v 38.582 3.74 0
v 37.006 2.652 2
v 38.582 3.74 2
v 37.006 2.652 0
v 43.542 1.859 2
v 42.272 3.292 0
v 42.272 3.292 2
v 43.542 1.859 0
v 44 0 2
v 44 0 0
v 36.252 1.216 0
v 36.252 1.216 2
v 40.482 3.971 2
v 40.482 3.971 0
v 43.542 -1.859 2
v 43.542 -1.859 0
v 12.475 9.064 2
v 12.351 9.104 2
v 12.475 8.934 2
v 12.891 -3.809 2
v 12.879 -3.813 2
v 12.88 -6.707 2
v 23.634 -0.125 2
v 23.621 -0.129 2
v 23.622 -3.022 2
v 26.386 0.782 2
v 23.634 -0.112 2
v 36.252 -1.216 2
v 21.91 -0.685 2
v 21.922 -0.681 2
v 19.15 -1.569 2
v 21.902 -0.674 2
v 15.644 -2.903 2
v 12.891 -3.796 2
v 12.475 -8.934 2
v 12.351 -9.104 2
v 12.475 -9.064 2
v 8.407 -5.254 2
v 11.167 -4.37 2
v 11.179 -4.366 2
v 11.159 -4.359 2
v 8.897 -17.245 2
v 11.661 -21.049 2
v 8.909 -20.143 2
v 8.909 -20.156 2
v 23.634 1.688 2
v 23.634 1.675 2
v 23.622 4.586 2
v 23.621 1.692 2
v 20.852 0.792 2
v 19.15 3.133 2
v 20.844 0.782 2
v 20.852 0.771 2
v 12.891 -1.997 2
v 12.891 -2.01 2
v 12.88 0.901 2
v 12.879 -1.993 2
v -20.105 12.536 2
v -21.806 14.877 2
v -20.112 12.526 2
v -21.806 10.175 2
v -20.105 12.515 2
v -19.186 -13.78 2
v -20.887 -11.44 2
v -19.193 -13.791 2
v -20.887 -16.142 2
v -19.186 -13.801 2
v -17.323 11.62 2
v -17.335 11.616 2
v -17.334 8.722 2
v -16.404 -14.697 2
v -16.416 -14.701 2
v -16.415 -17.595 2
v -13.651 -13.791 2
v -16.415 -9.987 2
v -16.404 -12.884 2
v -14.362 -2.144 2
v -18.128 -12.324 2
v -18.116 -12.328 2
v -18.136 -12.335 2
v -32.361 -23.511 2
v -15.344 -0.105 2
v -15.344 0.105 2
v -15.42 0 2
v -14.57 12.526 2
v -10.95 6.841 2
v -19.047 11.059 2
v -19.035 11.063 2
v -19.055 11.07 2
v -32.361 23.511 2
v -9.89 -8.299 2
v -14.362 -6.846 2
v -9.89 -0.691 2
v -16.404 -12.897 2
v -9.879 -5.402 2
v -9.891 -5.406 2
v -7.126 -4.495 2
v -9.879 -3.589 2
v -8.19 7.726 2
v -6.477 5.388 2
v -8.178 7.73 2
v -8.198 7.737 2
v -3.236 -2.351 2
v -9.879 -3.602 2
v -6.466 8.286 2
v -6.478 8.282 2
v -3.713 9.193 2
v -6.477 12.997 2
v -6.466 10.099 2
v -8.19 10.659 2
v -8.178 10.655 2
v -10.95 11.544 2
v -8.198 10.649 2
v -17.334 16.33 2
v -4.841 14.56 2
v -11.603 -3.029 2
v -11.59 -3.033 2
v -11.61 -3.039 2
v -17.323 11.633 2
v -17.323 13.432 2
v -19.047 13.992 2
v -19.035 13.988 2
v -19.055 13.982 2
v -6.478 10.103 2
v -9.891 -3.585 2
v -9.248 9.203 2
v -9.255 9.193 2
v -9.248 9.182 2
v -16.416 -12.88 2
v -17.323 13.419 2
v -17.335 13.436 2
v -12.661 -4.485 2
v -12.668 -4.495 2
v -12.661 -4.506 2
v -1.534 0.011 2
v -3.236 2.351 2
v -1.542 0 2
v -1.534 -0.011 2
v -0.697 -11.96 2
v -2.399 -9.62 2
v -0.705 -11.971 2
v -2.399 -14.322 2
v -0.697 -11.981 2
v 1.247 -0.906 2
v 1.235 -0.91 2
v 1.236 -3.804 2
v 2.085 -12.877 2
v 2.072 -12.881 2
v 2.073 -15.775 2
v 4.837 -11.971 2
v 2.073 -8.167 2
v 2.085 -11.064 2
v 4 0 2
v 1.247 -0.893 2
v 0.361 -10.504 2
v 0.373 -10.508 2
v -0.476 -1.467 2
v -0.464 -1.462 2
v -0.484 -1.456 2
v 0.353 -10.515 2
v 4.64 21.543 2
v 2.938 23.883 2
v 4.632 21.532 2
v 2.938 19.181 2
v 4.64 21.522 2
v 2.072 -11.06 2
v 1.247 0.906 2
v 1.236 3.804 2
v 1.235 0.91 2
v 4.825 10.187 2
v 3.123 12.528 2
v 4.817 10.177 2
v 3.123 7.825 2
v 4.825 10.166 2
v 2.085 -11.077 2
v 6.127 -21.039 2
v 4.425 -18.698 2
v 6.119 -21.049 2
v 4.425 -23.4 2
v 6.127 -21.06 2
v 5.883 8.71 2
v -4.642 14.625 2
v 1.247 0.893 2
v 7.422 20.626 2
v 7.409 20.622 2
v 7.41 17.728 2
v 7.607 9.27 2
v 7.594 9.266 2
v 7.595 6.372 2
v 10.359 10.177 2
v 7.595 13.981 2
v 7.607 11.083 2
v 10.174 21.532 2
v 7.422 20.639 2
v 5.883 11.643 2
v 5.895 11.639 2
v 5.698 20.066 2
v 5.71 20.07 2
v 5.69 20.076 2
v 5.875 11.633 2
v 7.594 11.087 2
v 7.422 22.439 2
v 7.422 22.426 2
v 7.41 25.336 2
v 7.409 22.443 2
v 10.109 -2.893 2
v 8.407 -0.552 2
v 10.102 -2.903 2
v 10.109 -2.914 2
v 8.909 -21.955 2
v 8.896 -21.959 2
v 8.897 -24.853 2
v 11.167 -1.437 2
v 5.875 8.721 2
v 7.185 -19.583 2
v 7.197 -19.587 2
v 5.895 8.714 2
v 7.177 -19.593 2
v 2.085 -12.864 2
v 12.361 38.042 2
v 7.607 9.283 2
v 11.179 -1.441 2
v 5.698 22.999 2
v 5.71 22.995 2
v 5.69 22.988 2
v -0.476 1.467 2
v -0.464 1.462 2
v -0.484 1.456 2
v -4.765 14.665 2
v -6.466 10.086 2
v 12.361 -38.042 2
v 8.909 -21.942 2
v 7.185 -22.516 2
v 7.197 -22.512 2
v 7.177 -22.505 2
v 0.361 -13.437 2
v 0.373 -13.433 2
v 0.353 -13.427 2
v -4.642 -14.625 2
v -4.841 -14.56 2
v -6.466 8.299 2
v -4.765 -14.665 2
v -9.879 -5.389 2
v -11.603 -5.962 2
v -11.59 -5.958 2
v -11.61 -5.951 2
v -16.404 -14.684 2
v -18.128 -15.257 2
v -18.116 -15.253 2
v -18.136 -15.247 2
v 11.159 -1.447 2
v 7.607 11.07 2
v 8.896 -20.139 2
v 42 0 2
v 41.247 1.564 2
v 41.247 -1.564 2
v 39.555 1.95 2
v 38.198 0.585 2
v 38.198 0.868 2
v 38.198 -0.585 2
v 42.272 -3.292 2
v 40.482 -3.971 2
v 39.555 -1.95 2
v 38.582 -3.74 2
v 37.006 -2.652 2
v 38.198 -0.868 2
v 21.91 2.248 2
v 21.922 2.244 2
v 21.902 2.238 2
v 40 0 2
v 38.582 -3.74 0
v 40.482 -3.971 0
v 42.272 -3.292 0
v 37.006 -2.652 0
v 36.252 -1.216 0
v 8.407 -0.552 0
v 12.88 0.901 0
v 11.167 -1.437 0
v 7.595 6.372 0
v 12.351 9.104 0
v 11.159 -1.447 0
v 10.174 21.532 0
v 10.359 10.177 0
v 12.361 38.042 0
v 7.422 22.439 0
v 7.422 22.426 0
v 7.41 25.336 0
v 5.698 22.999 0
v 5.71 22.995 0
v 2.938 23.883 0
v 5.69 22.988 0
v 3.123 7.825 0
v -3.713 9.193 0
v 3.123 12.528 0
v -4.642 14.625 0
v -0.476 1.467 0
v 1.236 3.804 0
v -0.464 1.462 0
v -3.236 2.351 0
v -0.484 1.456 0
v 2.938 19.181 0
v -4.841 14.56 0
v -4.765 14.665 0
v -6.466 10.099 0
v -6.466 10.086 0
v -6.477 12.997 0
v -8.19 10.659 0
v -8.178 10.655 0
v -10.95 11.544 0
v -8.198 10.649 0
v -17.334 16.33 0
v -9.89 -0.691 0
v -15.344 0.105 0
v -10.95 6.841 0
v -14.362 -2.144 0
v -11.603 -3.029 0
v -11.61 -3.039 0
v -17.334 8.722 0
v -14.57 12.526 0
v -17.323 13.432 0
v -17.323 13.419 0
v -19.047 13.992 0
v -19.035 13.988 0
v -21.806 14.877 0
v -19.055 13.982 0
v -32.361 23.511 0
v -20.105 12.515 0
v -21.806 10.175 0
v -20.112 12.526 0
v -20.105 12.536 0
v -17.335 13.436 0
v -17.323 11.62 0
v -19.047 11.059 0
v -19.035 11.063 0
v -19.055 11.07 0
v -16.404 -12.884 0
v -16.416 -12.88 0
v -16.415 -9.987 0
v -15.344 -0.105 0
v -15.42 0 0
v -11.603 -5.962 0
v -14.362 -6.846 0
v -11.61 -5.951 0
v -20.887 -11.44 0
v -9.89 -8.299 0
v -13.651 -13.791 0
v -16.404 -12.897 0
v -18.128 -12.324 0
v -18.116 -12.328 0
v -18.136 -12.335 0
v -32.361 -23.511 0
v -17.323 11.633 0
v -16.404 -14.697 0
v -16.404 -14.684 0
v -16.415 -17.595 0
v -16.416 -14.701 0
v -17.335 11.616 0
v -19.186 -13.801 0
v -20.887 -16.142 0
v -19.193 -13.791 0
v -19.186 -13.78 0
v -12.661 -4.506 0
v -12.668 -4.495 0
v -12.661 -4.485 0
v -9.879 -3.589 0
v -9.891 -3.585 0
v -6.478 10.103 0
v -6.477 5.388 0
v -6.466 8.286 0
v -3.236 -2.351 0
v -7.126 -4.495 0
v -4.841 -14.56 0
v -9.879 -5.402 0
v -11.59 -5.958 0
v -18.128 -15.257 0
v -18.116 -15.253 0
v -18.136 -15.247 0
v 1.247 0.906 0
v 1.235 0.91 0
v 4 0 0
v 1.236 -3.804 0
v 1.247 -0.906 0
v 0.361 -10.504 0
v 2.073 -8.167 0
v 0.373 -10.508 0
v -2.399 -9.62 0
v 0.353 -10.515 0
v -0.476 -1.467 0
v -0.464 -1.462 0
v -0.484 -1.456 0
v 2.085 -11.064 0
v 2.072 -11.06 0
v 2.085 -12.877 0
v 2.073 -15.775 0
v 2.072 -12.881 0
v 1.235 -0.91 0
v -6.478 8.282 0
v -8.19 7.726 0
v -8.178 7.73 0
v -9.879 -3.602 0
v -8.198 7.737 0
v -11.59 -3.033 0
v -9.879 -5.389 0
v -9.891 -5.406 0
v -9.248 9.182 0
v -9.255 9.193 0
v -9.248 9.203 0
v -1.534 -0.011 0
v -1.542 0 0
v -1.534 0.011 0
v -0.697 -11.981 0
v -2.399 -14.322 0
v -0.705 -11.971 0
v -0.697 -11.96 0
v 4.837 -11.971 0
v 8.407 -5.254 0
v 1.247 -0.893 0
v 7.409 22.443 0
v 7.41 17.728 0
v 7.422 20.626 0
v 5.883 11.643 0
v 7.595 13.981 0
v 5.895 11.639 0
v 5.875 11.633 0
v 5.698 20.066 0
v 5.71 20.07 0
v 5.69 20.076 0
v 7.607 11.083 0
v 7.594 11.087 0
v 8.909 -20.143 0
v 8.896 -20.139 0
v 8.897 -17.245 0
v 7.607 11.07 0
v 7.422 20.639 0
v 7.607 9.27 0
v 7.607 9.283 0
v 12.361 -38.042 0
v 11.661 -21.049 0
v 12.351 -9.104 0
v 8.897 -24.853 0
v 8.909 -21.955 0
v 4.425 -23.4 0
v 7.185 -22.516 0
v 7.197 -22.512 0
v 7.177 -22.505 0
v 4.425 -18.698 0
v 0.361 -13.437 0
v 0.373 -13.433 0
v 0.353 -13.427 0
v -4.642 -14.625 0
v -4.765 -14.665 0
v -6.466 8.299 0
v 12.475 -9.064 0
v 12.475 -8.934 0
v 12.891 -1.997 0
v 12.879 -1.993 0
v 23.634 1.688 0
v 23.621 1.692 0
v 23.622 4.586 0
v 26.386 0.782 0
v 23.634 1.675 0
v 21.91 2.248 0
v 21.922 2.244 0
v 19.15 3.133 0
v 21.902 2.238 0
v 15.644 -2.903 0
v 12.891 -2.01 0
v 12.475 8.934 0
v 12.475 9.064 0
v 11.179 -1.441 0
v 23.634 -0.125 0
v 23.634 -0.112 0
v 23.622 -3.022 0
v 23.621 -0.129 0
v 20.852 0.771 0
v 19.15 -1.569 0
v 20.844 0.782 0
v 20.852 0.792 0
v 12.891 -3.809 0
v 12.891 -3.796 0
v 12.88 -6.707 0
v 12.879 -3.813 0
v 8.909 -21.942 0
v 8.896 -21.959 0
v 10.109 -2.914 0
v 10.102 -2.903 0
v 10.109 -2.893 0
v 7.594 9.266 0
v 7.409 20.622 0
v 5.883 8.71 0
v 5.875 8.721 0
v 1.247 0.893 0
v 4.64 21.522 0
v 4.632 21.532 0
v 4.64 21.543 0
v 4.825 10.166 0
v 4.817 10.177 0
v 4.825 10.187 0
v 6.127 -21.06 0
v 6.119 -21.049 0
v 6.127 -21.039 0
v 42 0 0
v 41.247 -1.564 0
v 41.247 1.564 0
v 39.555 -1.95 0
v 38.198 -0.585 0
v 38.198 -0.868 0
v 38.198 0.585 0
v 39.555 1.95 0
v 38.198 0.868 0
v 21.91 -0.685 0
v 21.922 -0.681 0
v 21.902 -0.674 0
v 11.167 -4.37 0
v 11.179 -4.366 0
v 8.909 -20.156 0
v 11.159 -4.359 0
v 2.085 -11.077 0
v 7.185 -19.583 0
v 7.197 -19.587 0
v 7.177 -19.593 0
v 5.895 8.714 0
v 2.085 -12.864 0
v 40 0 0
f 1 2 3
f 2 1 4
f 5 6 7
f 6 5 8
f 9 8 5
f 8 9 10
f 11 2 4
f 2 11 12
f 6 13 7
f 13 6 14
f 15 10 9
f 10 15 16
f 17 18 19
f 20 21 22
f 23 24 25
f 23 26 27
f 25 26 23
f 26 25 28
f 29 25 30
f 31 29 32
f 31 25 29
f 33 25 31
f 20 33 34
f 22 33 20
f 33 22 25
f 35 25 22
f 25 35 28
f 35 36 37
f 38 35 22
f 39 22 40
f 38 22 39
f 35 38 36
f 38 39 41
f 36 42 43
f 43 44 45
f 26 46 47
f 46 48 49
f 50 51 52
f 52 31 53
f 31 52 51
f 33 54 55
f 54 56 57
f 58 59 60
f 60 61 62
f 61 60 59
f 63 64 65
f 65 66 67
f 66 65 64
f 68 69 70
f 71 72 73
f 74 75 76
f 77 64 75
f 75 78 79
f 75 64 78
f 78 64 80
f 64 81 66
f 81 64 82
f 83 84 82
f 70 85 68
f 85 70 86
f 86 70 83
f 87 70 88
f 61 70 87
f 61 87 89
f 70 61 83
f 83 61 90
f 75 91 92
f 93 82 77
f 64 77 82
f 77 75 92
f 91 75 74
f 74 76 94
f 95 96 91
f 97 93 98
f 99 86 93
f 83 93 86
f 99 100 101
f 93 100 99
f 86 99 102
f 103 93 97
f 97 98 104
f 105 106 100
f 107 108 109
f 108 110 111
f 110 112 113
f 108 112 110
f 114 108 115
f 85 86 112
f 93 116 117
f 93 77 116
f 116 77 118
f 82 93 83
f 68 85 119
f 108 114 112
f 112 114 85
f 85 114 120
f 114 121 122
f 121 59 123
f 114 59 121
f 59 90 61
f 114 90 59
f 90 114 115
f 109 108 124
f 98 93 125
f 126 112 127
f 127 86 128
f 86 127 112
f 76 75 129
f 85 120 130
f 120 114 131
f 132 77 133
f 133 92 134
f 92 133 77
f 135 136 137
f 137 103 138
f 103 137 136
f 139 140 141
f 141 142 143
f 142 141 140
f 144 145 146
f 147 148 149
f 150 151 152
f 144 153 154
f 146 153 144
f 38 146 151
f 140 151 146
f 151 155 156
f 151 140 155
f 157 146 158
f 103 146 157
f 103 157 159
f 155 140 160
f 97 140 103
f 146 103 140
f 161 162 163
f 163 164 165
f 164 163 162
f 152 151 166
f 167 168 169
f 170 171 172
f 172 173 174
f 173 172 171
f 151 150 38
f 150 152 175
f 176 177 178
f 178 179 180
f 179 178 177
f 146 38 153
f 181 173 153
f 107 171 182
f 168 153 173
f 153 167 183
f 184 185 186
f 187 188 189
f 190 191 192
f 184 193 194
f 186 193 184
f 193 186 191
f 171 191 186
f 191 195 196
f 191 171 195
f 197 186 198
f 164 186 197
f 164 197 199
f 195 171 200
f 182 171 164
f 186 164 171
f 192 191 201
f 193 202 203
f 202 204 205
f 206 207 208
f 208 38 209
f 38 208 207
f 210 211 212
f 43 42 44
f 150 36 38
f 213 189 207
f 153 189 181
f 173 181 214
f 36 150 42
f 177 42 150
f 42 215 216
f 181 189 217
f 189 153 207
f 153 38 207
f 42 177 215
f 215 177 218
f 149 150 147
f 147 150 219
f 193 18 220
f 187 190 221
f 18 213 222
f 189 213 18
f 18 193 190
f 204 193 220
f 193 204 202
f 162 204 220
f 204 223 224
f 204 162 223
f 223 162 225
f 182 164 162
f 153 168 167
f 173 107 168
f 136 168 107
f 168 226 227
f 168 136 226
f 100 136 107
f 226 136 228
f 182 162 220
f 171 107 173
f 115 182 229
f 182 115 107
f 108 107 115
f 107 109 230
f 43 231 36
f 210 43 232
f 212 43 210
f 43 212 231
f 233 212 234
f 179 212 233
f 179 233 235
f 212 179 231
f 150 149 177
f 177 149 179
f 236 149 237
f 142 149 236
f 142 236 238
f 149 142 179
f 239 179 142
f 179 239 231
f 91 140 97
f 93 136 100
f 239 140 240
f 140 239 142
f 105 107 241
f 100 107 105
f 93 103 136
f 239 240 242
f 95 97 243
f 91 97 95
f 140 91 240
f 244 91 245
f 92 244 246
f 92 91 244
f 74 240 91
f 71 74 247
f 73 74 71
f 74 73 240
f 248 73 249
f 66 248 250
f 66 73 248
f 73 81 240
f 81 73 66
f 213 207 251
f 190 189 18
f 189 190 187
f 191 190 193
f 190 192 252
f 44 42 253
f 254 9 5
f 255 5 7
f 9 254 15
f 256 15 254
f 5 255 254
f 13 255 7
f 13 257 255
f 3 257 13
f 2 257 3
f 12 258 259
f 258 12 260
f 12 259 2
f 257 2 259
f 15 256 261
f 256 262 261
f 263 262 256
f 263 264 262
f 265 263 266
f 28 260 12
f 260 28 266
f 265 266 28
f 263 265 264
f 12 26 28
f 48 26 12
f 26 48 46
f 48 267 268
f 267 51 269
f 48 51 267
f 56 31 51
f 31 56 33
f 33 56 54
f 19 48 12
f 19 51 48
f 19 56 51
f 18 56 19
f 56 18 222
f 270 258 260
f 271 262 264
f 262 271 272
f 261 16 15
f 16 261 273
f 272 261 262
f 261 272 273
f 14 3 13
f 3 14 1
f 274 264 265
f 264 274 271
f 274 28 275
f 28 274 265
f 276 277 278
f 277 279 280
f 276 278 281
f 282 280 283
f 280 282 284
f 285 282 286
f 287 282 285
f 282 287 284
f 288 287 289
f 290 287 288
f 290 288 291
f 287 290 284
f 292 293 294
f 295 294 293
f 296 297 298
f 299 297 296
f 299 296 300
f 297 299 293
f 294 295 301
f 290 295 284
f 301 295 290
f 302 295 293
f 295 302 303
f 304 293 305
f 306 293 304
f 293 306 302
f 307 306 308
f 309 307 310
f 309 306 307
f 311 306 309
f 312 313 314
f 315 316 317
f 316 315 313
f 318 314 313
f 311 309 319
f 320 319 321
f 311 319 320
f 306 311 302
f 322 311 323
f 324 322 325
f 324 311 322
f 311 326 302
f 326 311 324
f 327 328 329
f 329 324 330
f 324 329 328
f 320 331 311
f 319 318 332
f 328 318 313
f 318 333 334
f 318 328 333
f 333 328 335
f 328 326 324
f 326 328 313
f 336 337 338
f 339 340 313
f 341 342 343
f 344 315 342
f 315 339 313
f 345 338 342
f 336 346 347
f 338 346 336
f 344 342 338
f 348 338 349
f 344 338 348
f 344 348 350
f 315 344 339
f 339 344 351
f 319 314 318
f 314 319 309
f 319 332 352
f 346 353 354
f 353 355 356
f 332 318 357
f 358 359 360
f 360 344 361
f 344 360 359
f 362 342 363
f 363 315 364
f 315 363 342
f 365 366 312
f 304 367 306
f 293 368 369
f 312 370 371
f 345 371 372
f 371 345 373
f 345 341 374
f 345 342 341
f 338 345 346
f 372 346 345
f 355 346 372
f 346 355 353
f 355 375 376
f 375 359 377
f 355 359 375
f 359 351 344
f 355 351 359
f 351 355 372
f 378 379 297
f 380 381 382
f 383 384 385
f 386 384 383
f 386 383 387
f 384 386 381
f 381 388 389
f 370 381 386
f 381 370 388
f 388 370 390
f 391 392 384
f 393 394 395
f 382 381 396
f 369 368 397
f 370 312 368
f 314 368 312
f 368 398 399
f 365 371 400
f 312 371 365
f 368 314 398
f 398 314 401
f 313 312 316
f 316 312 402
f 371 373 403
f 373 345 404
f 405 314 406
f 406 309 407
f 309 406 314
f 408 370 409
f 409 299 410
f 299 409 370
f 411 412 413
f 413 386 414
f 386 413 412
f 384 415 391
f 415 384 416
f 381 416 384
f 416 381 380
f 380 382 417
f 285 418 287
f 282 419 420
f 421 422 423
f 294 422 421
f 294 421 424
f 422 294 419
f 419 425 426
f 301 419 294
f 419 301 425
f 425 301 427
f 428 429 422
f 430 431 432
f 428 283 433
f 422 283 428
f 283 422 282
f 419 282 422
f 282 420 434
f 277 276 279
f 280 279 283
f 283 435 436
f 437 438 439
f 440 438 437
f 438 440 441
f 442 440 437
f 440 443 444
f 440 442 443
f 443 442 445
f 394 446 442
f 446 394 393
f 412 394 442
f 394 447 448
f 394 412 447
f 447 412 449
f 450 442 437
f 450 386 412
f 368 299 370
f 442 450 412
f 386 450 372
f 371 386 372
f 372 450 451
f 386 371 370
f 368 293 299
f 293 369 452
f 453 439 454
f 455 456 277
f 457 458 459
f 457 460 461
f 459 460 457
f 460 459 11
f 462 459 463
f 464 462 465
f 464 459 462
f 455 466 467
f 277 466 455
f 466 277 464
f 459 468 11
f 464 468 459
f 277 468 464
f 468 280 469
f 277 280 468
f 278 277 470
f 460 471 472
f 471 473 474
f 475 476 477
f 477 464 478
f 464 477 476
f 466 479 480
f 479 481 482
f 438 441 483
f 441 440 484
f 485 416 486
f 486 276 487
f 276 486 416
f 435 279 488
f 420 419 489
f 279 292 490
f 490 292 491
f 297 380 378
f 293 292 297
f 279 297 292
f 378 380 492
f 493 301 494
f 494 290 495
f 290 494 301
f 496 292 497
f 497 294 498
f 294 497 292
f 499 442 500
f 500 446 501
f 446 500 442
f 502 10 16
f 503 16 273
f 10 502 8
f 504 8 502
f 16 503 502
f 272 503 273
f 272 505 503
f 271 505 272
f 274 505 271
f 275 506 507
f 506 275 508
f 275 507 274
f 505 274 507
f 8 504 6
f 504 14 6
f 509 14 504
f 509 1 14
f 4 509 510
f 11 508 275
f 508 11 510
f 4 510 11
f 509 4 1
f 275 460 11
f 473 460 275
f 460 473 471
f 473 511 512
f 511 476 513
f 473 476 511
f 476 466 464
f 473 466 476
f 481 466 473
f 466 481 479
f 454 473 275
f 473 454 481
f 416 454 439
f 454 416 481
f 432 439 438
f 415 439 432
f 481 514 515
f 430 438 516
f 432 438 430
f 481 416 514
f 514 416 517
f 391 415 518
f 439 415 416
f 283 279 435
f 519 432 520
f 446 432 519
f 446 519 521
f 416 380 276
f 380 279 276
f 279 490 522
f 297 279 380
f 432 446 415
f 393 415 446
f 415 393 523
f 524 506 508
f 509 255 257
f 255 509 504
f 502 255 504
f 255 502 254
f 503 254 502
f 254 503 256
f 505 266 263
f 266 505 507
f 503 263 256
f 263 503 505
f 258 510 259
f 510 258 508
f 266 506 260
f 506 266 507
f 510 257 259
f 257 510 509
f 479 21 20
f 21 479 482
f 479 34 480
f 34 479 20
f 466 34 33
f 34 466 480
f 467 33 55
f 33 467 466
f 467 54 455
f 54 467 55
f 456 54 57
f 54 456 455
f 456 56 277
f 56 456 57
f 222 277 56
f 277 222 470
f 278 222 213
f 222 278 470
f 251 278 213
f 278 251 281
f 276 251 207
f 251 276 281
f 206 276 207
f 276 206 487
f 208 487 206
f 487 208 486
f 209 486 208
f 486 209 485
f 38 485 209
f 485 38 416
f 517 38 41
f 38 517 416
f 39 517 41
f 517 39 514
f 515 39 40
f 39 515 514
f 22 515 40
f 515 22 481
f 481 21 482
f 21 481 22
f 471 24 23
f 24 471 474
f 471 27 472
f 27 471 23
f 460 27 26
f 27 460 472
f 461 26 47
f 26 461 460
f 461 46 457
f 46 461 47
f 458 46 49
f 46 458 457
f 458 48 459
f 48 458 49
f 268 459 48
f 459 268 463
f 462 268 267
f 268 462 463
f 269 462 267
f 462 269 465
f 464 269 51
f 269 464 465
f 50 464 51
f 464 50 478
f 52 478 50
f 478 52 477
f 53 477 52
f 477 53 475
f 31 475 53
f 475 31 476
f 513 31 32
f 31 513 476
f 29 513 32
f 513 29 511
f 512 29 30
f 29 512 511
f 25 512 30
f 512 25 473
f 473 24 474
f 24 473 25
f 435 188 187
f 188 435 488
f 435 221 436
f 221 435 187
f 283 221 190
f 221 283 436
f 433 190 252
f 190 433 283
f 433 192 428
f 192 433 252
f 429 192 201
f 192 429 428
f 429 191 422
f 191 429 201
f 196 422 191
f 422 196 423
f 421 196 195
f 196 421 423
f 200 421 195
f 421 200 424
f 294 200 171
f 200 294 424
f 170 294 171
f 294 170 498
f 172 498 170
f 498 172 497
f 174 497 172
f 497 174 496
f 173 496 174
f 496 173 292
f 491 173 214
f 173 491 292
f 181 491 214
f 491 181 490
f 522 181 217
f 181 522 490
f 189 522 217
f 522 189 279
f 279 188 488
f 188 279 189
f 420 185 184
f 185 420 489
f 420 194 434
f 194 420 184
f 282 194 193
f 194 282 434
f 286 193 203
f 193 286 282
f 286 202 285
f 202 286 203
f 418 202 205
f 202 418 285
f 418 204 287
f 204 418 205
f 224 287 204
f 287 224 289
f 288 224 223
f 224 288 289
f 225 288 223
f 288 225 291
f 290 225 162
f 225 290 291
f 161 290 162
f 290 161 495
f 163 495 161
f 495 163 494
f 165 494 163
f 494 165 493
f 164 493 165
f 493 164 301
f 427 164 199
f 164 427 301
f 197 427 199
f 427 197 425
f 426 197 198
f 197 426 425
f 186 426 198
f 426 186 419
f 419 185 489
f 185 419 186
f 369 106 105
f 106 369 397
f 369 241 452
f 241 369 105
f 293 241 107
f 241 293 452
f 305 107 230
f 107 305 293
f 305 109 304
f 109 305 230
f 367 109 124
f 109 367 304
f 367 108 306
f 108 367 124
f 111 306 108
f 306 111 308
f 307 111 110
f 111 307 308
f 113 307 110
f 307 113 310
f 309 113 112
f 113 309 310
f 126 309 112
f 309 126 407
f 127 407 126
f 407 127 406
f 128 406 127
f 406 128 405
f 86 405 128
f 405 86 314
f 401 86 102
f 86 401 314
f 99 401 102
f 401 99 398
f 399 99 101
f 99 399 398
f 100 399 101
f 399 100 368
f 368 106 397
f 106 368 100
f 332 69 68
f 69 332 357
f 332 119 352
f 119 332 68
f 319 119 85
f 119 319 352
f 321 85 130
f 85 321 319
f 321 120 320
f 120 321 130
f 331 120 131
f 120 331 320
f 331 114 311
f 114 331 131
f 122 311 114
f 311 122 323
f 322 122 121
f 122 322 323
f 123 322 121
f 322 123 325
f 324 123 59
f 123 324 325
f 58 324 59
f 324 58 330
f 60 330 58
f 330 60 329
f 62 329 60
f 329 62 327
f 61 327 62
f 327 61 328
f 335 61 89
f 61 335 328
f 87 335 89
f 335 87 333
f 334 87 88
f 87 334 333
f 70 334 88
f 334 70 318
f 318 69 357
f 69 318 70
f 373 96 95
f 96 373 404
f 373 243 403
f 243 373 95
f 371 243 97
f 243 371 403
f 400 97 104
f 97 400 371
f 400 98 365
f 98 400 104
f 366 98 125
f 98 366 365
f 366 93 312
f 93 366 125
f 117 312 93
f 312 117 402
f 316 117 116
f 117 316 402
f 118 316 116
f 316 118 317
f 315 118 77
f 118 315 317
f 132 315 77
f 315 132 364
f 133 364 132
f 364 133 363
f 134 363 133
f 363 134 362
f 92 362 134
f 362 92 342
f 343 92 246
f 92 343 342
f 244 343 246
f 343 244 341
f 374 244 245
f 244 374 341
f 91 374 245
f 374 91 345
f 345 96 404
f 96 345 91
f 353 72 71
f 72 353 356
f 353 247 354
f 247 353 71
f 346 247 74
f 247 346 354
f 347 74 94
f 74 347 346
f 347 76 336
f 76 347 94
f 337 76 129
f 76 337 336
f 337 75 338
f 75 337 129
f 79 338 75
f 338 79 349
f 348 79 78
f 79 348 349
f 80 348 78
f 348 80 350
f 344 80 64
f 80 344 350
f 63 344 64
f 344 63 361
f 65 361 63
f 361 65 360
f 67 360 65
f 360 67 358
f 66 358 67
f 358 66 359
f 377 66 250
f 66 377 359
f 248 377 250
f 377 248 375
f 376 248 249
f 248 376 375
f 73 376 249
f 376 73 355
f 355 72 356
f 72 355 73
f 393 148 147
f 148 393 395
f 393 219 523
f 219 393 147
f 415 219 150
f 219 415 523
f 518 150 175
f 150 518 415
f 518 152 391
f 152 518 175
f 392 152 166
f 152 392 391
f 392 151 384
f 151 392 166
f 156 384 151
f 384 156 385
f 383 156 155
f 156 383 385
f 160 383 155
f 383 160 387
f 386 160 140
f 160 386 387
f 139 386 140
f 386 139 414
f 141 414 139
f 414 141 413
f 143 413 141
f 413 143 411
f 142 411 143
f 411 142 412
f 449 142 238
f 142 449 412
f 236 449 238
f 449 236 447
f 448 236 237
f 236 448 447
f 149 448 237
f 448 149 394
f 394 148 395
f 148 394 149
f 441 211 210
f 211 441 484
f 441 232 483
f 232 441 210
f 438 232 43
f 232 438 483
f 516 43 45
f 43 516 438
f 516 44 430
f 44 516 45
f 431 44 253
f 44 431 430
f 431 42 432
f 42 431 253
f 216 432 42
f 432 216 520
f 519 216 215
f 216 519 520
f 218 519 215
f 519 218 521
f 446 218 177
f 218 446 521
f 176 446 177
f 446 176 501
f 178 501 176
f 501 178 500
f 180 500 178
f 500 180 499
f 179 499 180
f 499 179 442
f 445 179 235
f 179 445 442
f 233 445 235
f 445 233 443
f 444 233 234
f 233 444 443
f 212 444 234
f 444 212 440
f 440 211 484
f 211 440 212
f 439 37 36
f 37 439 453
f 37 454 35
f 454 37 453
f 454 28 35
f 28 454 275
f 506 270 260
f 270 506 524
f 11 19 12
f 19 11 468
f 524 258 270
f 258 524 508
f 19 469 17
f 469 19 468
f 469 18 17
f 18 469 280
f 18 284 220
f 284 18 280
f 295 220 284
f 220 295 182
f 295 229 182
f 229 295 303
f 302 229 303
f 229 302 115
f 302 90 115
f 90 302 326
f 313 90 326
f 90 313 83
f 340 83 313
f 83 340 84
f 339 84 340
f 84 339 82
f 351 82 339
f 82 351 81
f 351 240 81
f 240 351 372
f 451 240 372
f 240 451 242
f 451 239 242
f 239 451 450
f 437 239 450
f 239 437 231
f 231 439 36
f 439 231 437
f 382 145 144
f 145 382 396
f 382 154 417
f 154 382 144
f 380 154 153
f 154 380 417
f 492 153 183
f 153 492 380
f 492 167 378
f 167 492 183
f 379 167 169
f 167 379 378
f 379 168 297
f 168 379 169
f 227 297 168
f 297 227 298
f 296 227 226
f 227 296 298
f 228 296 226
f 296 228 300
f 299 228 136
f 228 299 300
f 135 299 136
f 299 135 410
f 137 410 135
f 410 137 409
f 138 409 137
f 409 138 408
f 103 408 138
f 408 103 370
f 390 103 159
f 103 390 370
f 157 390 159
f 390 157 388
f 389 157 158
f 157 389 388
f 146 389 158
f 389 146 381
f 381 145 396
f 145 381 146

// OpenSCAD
// radius of the large star
radius=40;
// radius of the small stars
little=4;
//thickness
thick=2;
//-- Based on Parametric star(c)  2010 Juan Gonzalez-Gomez (Obijuan) juan@iearobotics.com
//-- GPL license

//-- The 2*N points of an N-ponted star are calculated as follows:
//-- There are two circunferences:  the inner and outer.  Outer points are located
//-- at angles: 0, 360/N, 360*2/N and on the outer circunference
//-- The inner points have the same angular distance but they are 360/(2*N) rotated
//-- respect to the outers. They are located on the inner circunference

//--- INPUT PARAMETERS:
//--- N: Number of points
//--  h: Height
//-- ri: Inner radius
//-- ro: outer radius
module parametric_star(N=5, h=2, ri=15, re=30) {

  //-- Calculate and draw a 2D tip of the star
 //-- INPUT: 
 //-- n: Number of the tip (from 0 to N-1)
  module tipstar(n) {
     i1 =  [ri*cos(-360*n/N+360/(N*2)), ri*sin(-360*n/N+360/(N*2))];
    e1 = [re*cos(-360*n/N), re*sin(-360*n/N)];
    i2 = [ri*cos(-360*(n+1)/N+360/(N*2)), ri*sin(-360*(n+1)/N+360/(N*2))];
    polygon([ i1, e1, i2]);
  }

  //-- Draw the 2D star and extrude
  
   //-- The star is the union of N 2D tips. 
   //-- A inner cylinder is also needed for filling
   //-- A flat (2D) star is built. The it is extruded
    linear_extrude(height=h) 
    union() {
      for (i=[0:N-1]) {
         tipstar(i);
      }
      rotate([0,0,360/(2*N)]) circle(r=ri+ri*0.01,$fn=N);
    }
}

radius=40;
little=4;
union(){
difference(){
translate([radius,0,0]) cylinder(thick,4,4);
translate([radius,0,0]) cylinder(thick,2,2);
}
difference(){
	parametric_star(N=5,h=thick, ri=radius/2.62,re=radius);
	parametric_star(N=5,h=thick, ri=little/2.62,re=little);
		for (j=[0:4]){
	//	x1= outer*cos(j*72-14)
	//	y1=outer*sin(j*72-14)
	translate([0.3*radius*cos(j*72-14),0.3*radius*sin(j*72-14),0]) parametric_star(N=5,h=thick, ri=little/2.62,re=little);
	translate([0.56*radius*cos(j*72+2),0.56*radius*sin(j*72+2),0]) parametric_star(N=5,h=thick, ri=little/2.62,re=little);
	}
}
}


